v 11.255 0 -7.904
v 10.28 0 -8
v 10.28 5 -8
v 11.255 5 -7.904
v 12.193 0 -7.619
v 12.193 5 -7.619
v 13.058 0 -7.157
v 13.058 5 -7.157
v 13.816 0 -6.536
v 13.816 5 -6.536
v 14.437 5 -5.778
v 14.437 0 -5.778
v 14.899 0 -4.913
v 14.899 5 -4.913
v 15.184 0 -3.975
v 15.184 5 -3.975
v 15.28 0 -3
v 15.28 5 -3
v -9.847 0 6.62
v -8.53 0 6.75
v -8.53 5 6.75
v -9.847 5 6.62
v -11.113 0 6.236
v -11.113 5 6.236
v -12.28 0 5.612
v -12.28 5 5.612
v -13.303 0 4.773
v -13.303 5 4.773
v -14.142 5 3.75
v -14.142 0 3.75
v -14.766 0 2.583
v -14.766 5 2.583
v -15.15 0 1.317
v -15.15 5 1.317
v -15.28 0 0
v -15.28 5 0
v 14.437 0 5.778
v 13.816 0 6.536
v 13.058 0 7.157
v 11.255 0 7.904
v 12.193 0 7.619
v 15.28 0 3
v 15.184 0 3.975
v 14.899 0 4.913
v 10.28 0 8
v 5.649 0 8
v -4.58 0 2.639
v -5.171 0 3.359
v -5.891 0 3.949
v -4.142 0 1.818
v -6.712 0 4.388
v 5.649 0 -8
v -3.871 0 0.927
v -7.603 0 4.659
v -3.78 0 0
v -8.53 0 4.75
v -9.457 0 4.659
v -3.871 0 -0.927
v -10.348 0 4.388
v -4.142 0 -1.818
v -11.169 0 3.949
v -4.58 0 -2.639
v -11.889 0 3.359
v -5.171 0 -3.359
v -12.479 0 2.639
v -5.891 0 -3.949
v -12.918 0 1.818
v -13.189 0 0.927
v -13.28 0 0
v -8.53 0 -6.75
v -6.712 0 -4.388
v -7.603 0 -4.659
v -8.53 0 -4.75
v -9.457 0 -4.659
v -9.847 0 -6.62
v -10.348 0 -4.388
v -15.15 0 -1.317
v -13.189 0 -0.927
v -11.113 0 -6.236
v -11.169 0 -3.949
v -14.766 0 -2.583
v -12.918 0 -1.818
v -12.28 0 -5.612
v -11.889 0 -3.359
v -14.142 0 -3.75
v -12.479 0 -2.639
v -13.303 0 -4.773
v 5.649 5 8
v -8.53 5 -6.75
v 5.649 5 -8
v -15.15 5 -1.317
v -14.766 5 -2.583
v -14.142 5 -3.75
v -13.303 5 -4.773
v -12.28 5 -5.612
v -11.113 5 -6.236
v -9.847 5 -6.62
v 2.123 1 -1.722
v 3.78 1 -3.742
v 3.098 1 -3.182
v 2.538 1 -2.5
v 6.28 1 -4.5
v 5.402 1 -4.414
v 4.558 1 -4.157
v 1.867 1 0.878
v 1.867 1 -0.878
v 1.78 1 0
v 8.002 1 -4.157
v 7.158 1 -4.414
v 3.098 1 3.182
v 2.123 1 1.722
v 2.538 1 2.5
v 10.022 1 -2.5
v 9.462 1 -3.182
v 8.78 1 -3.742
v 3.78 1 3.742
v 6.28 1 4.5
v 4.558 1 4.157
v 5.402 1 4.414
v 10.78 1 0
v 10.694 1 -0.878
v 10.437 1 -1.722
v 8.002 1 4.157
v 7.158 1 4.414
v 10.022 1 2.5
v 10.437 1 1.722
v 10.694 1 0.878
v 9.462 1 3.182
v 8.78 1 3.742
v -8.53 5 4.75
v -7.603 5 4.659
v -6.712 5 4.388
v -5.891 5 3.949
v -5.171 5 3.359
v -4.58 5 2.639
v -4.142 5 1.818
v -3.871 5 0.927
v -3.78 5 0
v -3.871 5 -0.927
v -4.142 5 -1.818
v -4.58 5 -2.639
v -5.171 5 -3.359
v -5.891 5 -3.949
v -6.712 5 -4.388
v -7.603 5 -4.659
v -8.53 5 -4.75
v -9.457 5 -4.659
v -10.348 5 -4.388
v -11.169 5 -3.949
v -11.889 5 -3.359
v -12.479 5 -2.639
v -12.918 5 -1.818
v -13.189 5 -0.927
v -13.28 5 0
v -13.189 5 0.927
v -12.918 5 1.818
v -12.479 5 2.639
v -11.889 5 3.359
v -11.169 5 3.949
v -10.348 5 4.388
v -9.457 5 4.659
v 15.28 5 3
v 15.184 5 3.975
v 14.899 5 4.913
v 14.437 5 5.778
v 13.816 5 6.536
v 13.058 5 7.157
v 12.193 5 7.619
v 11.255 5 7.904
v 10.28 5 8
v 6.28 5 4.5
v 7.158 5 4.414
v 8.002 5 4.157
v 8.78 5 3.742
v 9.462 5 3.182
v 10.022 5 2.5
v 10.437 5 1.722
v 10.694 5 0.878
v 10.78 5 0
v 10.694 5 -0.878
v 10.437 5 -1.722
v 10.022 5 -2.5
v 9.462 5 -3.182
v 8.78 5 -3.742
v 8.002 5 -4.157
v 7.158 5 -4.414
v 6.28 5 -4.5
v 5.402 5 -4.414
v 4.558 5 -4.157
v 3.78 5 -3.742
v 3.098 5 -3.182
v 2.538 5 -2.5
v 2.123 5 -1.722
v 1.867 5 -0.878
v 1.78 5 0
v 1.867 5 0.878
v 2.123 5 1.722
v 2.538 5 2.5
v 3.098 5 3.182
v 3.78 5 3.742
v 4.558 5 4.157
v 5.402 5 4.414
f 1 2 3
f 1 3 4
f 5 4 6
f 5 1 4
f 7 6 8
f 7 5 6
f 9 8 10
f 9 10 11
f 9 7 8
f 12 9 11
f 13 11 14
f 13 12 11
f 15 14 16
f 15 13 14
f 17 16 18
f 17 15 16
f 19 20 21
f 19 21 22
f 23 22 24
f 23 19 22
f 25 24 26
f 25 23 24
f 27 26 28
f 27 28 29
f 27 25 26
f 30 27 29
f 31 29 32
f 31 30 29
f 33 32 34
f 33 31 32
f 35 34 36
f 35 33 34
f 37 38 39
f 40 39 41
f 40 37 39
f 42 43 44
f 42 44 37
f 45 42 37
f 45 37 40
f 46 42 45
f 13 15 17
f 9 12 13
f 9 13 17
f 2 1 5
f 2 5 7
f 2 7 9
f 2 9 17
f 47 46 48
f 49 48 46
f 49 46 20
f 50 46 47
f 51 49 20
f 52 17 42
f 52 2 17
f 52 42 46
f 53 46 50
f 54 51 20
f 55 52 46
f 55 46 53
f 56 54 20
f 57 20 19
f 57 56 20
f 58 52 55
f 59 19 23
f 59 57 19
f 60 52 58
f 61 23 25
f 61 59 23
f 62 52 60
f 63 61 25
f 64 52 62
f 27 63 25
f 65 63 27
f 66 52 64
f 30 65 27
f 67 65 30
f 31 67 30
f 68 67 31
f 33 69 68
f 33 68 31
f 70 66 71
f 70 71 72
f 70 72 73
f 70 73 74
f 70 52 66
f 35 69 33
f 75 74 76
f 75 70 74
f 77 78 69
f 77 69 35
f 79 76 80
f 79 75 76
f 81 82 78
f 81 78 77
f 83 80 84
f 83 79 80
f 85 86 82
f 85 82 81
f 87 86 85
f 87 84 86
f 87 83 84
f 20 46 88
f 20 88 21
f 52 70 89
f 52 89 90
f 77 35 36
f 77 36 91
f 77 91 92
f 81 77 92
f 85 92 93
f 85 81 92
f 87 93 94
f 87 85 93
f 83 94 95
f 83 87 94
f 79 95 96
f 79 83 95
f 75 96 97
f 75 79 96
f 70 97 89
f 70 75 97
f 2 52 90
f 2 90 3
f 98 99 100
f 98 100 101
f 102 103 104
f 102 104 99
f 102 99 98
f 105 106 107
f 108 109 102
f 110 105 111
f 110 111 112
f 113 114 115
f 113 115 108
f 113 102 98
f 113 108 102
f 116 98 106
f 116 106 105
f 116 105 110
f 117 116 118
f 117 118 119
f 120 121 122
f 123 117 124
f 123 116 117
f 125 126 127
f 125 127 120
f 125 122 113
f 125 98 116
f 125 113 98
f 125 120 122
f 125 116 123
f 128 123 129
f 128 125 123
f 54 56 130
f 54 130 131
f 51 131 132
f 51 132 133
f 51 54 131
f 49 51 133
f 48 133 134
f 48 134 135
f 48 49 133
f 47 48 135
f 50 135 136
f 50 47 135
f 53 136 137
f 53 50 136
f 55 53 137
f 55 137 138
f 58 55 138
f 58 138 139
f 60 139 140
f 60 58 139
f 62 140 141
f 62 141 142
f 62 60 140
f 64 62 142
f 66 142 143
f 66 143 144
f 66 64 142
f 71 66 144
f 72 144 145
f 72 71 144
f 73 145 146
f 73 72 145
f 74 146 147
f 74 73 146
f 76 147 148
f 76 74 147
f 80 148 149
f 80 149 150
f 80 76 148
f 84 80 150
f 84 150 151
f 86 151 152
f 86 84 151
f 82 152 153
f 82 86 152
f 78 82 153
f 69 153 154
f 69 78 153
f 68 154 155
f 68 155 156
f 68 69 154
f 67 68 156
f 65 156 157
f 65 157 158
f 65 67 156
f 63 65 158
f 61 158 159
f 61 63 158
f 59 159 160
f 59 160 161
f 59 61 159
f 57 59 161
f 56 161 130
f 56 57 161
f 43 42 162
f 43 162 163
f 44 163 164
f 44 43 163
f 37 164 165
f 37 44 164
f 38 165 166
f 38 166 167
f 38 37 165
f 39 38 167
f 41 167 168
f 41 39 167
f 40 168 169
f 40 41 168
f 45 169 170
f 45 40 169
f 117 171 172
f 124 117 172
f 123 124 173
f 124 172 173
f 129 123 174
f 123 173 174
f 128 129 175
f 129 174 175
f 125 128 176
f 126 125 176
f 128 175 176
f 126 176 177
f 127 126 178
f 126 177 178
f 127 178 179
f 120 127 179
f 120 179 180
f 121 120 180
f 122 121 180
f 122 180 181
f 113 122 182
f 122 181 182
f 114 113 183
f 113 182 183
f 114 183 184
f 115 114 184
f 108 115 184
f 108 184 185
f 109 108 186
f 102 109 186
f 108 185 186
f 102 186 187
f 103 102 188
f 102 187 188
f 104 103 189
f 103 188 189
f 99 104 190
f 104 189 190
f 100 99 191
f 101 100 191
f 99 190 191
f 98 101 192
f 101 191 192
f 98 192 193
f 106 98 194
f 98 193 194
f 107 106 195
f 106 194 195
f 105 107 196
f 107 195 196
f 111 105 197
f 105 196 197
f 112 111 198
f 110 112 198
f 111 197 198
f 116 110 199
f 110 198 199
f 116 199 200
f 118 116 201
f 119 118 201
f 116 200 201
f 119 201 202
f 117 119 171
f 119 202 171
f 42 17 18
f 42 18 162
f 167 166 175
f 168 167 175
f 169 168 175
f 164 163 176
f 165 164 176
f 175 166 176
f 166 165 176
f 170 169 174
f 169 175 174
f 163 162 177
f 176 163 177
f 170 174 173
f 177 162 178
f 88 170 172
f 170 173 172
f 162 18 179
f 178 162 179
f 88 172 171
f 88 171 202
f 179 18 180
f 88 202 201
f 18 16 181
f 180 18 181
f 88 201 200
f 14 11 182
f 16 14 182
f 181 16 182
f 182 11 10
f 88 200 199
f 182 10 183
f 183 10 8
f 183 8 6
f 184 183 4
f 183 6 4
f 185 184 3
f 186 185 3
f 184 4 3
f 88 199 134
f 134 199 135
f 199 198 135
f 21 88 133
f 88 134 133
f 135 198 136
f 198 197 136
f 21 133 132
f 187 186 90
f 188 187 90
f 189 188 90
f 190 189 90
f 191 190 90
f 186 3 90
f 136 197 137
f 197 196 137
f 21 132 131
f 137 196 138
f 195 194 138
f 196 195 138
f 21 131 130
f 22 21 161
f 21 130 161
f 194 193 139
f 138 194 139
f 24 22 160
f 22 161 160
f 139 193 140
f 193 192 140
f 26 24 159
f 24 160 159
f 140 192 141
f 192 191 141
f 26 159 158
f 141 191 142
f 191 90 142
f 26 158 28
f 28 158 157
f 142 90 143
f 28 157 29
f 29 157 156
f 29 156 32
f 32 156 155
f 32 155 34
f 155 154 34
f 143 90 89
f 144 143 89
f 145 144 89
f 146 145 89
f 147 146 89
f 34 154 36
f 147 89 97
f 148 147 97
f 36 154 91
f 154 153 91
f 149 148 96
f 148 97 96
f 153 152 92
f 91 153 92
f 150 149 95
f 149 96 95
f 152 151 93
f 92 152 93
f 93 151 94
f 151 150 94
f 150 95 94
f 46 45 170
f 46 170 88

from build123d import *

# Parameters (mm, degrees)
SKETCH1_R           = 4.75
BOSS_EXTRUDE1_DEPTH = 5
SKETCH2_R           = 4.5
CUT_EXTRUDE1_DEPTH  = 4


with BuildPart() as part:
    # Sketch1 → Boss-Extrude1 (new body)
    with BuildSketch(Plane(origin=(0, 0, 0), x_dir=(1, 0, 0), z_dir=(0, 1, 0))):
        with BuildLine():
            Line((5.649139951, 8), (10.28, 8))
            ThreePointArc((10.28, 8), (13.815533906, 6.535533906), (15.28, 3))
            Line((15.28, 3), (15.28, -3))
            ThreePointArc((15.28, -3), (13.815533906, -6.535533906), (10.28, -8))
            Line((10.28, -8), (5.649139951, -8))
            Line((5.649139951, -8), (-8.529960299, -6.75))
            ThreePointArc((-8.529960299, -6.75), (-13.302950922, -4.772978995), (-15.28, 0))
            ThreePointArc((-15.28, 0), (-13.302950922, 4.772978995), (-8.529960299, 6.75))
            Line((-8.529960299, 6.75), (5.649139951, 8))
        make_face()
        with Locations(Location((-8.529960299, 0, 0), (0, 0, 270))):
            Circle(SKETCH1_R, mode=Mode.SUBTRACT)
    extrude(amount=BOSS_EXTRUDE1_DEPTH)

    # Sketch2 → Cut-Extrude1 (cut)
    with BuildSketch(Plane(origin=(0, 5, 0), x_dir=(1, 0, 0), z_dir=(0, 1, 0))):
        with Locations(Location((6.280039701, 0, 0), (0, 0, 270))):
            Circle(SKETCH2_R)
    extrude(amount=-CUT_EXTRUDE1_DEPTH, mode=Mode.SUBTRACT)


solid = part.part
